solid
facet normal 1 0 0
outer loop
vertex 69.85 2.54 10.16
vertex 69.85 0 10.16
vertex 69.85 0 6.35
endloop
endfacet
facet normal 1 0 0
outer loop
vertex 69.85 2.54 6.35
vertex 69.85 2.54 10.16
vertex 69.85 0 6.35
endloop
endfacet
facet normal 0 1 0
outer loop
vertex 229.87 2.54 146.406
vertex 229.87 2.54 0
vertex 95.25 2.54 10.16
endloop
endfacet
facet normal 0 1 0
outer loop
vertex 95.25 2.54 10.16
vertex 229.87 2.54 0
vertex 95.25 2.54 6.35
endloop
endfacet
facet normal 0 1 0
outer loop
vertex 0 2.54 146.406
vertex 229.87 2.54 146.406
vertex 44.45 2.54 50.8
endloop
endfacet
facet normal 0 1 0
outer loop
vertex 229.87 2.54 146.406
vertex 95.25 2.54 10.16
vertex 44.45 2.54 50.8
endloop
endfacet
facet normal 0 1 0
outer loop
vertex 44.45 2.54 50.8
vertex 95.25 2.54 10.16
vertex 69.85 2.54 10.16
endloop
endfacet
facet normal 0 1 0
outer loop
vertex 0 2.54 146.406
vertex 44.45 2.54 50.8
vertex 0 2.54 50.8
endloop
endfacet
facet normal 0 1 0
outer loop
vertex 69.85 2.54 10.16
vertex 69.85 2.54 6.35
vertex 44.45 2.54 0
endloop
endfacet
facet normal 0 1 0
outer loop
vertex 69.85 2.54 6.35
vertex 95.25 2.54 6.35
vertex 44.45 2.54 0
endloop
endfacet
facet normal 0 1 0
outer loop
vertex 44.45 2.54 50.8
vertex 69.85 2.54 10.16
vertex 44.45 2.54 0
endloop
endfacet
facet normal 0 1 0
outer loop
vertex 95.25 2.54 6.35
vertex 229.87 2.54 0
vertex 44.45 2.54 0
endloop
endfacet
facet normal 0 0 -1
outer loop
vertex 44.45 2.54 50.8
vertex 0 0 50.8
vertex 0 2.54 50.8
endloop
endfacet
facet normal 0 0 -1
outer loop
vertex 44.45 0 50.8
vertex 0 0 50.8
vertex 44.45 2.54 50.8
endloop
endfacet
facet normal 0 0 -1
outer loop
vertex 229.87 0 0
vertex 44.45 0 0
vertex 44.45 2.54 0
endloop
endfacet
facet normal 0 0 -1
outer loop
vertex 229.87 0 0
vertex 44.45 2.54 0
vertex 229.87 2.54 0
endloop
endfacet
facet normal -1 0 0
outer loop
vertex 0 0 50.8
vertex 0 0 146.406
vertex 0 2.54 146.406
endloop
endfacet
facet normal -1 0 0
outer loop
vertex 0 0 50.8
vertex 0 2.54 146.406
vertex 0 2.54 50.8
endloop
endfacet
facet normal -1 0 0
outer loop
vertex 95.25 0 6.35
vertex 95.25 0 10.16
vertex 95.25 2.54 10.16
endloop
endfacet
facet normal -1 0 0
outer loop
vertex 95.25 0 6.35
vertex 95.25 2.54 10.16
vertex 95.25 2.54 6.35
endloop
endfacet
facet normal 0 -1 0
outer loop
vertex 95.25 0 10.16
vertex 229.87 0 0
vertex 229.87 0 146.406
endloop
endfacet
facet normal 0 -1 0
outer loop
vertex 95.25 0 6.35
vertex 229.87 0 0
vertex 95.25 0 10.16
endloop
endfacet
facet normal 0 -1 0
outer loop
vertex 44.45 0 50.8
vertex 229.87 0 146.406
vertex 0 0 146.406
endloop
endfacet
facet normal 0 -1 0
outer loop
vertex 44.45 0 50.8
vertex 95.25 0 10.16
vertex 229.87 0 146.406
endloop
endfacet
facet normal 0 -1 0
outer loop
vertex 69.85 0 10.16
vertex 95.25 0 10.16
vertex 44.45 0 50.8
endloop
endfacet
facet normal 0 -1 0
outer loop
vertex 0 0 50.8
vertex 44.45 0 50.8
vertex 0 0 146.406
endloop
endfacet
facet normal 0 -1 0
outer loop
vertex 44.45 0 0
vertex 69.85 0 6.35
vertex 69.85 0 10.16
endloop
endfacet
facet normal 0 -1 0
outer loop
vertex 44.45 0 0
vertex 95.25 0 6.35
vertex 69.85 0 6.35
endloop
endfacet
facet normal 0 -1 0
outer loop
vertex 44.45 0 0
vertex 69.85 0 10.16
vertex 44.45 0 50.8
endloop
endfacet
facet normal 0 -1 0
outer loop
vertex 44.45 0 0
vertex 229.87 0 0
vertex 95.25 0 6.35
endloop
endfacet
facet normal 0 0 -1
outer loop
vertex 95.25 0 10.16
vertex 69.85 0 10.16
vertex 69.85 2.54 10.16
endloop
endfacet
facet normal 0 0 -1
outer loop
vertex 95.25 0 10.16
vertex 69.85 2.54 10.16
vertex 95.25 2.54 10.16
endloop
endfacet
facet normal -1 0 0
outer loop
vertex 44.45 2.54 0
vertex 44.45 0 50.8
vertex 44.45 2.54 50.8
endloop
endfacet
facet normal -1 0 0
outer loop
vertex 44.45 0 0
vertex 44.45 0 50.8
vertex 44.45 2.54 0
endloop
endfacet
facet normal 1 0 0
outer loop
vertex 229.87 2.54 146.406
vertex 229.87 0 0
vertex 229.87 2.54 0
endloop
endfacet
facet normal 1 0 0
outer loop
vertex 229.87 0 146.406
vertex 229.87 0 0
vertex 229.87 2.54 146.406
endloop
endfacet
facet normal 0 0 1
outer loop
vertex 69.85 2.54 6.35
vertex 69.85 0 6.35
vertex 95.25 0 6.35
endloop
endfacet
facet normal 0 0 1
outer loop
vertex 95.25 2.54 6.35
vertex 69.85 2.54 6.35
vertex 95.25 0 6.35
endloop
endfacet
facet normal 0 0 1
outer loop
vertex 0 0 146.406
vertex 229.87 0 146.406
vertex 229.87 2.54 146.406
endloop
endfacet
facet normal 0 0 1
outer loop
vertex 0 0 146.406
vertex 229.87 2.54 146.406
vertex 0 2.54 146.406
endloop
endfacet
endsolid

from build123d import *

# Parameters (mm, degrees)
SKETCH1_W           = 25.4
SKETCH1_H           = 3.81
BOSS_EXTRUDE1_DEPTH = 2.54


with BuildPart() as part:
    # Sketch1 → Boss-Extrude1 (new body)
    with BuildSketch(Plane(origin=(0, 0, 0), x_dir=(1, 0, 0), z_dir=(0, 1, 0))):
        Polygon((0, -50.8), (44.45, -50.8), (44.45, 0), (229.87, 0), (229.87, -146.4056), (0, -146.4056), align=None)
        with Locations((82.55, -8.255)):
            Rectangle(SKETCH1_W, SKETCH1_H, mode=Mode.SUBTRACT)
    extrude(amount=BOSS_EXTRUDE1_DEPTH)


solid = part.part
